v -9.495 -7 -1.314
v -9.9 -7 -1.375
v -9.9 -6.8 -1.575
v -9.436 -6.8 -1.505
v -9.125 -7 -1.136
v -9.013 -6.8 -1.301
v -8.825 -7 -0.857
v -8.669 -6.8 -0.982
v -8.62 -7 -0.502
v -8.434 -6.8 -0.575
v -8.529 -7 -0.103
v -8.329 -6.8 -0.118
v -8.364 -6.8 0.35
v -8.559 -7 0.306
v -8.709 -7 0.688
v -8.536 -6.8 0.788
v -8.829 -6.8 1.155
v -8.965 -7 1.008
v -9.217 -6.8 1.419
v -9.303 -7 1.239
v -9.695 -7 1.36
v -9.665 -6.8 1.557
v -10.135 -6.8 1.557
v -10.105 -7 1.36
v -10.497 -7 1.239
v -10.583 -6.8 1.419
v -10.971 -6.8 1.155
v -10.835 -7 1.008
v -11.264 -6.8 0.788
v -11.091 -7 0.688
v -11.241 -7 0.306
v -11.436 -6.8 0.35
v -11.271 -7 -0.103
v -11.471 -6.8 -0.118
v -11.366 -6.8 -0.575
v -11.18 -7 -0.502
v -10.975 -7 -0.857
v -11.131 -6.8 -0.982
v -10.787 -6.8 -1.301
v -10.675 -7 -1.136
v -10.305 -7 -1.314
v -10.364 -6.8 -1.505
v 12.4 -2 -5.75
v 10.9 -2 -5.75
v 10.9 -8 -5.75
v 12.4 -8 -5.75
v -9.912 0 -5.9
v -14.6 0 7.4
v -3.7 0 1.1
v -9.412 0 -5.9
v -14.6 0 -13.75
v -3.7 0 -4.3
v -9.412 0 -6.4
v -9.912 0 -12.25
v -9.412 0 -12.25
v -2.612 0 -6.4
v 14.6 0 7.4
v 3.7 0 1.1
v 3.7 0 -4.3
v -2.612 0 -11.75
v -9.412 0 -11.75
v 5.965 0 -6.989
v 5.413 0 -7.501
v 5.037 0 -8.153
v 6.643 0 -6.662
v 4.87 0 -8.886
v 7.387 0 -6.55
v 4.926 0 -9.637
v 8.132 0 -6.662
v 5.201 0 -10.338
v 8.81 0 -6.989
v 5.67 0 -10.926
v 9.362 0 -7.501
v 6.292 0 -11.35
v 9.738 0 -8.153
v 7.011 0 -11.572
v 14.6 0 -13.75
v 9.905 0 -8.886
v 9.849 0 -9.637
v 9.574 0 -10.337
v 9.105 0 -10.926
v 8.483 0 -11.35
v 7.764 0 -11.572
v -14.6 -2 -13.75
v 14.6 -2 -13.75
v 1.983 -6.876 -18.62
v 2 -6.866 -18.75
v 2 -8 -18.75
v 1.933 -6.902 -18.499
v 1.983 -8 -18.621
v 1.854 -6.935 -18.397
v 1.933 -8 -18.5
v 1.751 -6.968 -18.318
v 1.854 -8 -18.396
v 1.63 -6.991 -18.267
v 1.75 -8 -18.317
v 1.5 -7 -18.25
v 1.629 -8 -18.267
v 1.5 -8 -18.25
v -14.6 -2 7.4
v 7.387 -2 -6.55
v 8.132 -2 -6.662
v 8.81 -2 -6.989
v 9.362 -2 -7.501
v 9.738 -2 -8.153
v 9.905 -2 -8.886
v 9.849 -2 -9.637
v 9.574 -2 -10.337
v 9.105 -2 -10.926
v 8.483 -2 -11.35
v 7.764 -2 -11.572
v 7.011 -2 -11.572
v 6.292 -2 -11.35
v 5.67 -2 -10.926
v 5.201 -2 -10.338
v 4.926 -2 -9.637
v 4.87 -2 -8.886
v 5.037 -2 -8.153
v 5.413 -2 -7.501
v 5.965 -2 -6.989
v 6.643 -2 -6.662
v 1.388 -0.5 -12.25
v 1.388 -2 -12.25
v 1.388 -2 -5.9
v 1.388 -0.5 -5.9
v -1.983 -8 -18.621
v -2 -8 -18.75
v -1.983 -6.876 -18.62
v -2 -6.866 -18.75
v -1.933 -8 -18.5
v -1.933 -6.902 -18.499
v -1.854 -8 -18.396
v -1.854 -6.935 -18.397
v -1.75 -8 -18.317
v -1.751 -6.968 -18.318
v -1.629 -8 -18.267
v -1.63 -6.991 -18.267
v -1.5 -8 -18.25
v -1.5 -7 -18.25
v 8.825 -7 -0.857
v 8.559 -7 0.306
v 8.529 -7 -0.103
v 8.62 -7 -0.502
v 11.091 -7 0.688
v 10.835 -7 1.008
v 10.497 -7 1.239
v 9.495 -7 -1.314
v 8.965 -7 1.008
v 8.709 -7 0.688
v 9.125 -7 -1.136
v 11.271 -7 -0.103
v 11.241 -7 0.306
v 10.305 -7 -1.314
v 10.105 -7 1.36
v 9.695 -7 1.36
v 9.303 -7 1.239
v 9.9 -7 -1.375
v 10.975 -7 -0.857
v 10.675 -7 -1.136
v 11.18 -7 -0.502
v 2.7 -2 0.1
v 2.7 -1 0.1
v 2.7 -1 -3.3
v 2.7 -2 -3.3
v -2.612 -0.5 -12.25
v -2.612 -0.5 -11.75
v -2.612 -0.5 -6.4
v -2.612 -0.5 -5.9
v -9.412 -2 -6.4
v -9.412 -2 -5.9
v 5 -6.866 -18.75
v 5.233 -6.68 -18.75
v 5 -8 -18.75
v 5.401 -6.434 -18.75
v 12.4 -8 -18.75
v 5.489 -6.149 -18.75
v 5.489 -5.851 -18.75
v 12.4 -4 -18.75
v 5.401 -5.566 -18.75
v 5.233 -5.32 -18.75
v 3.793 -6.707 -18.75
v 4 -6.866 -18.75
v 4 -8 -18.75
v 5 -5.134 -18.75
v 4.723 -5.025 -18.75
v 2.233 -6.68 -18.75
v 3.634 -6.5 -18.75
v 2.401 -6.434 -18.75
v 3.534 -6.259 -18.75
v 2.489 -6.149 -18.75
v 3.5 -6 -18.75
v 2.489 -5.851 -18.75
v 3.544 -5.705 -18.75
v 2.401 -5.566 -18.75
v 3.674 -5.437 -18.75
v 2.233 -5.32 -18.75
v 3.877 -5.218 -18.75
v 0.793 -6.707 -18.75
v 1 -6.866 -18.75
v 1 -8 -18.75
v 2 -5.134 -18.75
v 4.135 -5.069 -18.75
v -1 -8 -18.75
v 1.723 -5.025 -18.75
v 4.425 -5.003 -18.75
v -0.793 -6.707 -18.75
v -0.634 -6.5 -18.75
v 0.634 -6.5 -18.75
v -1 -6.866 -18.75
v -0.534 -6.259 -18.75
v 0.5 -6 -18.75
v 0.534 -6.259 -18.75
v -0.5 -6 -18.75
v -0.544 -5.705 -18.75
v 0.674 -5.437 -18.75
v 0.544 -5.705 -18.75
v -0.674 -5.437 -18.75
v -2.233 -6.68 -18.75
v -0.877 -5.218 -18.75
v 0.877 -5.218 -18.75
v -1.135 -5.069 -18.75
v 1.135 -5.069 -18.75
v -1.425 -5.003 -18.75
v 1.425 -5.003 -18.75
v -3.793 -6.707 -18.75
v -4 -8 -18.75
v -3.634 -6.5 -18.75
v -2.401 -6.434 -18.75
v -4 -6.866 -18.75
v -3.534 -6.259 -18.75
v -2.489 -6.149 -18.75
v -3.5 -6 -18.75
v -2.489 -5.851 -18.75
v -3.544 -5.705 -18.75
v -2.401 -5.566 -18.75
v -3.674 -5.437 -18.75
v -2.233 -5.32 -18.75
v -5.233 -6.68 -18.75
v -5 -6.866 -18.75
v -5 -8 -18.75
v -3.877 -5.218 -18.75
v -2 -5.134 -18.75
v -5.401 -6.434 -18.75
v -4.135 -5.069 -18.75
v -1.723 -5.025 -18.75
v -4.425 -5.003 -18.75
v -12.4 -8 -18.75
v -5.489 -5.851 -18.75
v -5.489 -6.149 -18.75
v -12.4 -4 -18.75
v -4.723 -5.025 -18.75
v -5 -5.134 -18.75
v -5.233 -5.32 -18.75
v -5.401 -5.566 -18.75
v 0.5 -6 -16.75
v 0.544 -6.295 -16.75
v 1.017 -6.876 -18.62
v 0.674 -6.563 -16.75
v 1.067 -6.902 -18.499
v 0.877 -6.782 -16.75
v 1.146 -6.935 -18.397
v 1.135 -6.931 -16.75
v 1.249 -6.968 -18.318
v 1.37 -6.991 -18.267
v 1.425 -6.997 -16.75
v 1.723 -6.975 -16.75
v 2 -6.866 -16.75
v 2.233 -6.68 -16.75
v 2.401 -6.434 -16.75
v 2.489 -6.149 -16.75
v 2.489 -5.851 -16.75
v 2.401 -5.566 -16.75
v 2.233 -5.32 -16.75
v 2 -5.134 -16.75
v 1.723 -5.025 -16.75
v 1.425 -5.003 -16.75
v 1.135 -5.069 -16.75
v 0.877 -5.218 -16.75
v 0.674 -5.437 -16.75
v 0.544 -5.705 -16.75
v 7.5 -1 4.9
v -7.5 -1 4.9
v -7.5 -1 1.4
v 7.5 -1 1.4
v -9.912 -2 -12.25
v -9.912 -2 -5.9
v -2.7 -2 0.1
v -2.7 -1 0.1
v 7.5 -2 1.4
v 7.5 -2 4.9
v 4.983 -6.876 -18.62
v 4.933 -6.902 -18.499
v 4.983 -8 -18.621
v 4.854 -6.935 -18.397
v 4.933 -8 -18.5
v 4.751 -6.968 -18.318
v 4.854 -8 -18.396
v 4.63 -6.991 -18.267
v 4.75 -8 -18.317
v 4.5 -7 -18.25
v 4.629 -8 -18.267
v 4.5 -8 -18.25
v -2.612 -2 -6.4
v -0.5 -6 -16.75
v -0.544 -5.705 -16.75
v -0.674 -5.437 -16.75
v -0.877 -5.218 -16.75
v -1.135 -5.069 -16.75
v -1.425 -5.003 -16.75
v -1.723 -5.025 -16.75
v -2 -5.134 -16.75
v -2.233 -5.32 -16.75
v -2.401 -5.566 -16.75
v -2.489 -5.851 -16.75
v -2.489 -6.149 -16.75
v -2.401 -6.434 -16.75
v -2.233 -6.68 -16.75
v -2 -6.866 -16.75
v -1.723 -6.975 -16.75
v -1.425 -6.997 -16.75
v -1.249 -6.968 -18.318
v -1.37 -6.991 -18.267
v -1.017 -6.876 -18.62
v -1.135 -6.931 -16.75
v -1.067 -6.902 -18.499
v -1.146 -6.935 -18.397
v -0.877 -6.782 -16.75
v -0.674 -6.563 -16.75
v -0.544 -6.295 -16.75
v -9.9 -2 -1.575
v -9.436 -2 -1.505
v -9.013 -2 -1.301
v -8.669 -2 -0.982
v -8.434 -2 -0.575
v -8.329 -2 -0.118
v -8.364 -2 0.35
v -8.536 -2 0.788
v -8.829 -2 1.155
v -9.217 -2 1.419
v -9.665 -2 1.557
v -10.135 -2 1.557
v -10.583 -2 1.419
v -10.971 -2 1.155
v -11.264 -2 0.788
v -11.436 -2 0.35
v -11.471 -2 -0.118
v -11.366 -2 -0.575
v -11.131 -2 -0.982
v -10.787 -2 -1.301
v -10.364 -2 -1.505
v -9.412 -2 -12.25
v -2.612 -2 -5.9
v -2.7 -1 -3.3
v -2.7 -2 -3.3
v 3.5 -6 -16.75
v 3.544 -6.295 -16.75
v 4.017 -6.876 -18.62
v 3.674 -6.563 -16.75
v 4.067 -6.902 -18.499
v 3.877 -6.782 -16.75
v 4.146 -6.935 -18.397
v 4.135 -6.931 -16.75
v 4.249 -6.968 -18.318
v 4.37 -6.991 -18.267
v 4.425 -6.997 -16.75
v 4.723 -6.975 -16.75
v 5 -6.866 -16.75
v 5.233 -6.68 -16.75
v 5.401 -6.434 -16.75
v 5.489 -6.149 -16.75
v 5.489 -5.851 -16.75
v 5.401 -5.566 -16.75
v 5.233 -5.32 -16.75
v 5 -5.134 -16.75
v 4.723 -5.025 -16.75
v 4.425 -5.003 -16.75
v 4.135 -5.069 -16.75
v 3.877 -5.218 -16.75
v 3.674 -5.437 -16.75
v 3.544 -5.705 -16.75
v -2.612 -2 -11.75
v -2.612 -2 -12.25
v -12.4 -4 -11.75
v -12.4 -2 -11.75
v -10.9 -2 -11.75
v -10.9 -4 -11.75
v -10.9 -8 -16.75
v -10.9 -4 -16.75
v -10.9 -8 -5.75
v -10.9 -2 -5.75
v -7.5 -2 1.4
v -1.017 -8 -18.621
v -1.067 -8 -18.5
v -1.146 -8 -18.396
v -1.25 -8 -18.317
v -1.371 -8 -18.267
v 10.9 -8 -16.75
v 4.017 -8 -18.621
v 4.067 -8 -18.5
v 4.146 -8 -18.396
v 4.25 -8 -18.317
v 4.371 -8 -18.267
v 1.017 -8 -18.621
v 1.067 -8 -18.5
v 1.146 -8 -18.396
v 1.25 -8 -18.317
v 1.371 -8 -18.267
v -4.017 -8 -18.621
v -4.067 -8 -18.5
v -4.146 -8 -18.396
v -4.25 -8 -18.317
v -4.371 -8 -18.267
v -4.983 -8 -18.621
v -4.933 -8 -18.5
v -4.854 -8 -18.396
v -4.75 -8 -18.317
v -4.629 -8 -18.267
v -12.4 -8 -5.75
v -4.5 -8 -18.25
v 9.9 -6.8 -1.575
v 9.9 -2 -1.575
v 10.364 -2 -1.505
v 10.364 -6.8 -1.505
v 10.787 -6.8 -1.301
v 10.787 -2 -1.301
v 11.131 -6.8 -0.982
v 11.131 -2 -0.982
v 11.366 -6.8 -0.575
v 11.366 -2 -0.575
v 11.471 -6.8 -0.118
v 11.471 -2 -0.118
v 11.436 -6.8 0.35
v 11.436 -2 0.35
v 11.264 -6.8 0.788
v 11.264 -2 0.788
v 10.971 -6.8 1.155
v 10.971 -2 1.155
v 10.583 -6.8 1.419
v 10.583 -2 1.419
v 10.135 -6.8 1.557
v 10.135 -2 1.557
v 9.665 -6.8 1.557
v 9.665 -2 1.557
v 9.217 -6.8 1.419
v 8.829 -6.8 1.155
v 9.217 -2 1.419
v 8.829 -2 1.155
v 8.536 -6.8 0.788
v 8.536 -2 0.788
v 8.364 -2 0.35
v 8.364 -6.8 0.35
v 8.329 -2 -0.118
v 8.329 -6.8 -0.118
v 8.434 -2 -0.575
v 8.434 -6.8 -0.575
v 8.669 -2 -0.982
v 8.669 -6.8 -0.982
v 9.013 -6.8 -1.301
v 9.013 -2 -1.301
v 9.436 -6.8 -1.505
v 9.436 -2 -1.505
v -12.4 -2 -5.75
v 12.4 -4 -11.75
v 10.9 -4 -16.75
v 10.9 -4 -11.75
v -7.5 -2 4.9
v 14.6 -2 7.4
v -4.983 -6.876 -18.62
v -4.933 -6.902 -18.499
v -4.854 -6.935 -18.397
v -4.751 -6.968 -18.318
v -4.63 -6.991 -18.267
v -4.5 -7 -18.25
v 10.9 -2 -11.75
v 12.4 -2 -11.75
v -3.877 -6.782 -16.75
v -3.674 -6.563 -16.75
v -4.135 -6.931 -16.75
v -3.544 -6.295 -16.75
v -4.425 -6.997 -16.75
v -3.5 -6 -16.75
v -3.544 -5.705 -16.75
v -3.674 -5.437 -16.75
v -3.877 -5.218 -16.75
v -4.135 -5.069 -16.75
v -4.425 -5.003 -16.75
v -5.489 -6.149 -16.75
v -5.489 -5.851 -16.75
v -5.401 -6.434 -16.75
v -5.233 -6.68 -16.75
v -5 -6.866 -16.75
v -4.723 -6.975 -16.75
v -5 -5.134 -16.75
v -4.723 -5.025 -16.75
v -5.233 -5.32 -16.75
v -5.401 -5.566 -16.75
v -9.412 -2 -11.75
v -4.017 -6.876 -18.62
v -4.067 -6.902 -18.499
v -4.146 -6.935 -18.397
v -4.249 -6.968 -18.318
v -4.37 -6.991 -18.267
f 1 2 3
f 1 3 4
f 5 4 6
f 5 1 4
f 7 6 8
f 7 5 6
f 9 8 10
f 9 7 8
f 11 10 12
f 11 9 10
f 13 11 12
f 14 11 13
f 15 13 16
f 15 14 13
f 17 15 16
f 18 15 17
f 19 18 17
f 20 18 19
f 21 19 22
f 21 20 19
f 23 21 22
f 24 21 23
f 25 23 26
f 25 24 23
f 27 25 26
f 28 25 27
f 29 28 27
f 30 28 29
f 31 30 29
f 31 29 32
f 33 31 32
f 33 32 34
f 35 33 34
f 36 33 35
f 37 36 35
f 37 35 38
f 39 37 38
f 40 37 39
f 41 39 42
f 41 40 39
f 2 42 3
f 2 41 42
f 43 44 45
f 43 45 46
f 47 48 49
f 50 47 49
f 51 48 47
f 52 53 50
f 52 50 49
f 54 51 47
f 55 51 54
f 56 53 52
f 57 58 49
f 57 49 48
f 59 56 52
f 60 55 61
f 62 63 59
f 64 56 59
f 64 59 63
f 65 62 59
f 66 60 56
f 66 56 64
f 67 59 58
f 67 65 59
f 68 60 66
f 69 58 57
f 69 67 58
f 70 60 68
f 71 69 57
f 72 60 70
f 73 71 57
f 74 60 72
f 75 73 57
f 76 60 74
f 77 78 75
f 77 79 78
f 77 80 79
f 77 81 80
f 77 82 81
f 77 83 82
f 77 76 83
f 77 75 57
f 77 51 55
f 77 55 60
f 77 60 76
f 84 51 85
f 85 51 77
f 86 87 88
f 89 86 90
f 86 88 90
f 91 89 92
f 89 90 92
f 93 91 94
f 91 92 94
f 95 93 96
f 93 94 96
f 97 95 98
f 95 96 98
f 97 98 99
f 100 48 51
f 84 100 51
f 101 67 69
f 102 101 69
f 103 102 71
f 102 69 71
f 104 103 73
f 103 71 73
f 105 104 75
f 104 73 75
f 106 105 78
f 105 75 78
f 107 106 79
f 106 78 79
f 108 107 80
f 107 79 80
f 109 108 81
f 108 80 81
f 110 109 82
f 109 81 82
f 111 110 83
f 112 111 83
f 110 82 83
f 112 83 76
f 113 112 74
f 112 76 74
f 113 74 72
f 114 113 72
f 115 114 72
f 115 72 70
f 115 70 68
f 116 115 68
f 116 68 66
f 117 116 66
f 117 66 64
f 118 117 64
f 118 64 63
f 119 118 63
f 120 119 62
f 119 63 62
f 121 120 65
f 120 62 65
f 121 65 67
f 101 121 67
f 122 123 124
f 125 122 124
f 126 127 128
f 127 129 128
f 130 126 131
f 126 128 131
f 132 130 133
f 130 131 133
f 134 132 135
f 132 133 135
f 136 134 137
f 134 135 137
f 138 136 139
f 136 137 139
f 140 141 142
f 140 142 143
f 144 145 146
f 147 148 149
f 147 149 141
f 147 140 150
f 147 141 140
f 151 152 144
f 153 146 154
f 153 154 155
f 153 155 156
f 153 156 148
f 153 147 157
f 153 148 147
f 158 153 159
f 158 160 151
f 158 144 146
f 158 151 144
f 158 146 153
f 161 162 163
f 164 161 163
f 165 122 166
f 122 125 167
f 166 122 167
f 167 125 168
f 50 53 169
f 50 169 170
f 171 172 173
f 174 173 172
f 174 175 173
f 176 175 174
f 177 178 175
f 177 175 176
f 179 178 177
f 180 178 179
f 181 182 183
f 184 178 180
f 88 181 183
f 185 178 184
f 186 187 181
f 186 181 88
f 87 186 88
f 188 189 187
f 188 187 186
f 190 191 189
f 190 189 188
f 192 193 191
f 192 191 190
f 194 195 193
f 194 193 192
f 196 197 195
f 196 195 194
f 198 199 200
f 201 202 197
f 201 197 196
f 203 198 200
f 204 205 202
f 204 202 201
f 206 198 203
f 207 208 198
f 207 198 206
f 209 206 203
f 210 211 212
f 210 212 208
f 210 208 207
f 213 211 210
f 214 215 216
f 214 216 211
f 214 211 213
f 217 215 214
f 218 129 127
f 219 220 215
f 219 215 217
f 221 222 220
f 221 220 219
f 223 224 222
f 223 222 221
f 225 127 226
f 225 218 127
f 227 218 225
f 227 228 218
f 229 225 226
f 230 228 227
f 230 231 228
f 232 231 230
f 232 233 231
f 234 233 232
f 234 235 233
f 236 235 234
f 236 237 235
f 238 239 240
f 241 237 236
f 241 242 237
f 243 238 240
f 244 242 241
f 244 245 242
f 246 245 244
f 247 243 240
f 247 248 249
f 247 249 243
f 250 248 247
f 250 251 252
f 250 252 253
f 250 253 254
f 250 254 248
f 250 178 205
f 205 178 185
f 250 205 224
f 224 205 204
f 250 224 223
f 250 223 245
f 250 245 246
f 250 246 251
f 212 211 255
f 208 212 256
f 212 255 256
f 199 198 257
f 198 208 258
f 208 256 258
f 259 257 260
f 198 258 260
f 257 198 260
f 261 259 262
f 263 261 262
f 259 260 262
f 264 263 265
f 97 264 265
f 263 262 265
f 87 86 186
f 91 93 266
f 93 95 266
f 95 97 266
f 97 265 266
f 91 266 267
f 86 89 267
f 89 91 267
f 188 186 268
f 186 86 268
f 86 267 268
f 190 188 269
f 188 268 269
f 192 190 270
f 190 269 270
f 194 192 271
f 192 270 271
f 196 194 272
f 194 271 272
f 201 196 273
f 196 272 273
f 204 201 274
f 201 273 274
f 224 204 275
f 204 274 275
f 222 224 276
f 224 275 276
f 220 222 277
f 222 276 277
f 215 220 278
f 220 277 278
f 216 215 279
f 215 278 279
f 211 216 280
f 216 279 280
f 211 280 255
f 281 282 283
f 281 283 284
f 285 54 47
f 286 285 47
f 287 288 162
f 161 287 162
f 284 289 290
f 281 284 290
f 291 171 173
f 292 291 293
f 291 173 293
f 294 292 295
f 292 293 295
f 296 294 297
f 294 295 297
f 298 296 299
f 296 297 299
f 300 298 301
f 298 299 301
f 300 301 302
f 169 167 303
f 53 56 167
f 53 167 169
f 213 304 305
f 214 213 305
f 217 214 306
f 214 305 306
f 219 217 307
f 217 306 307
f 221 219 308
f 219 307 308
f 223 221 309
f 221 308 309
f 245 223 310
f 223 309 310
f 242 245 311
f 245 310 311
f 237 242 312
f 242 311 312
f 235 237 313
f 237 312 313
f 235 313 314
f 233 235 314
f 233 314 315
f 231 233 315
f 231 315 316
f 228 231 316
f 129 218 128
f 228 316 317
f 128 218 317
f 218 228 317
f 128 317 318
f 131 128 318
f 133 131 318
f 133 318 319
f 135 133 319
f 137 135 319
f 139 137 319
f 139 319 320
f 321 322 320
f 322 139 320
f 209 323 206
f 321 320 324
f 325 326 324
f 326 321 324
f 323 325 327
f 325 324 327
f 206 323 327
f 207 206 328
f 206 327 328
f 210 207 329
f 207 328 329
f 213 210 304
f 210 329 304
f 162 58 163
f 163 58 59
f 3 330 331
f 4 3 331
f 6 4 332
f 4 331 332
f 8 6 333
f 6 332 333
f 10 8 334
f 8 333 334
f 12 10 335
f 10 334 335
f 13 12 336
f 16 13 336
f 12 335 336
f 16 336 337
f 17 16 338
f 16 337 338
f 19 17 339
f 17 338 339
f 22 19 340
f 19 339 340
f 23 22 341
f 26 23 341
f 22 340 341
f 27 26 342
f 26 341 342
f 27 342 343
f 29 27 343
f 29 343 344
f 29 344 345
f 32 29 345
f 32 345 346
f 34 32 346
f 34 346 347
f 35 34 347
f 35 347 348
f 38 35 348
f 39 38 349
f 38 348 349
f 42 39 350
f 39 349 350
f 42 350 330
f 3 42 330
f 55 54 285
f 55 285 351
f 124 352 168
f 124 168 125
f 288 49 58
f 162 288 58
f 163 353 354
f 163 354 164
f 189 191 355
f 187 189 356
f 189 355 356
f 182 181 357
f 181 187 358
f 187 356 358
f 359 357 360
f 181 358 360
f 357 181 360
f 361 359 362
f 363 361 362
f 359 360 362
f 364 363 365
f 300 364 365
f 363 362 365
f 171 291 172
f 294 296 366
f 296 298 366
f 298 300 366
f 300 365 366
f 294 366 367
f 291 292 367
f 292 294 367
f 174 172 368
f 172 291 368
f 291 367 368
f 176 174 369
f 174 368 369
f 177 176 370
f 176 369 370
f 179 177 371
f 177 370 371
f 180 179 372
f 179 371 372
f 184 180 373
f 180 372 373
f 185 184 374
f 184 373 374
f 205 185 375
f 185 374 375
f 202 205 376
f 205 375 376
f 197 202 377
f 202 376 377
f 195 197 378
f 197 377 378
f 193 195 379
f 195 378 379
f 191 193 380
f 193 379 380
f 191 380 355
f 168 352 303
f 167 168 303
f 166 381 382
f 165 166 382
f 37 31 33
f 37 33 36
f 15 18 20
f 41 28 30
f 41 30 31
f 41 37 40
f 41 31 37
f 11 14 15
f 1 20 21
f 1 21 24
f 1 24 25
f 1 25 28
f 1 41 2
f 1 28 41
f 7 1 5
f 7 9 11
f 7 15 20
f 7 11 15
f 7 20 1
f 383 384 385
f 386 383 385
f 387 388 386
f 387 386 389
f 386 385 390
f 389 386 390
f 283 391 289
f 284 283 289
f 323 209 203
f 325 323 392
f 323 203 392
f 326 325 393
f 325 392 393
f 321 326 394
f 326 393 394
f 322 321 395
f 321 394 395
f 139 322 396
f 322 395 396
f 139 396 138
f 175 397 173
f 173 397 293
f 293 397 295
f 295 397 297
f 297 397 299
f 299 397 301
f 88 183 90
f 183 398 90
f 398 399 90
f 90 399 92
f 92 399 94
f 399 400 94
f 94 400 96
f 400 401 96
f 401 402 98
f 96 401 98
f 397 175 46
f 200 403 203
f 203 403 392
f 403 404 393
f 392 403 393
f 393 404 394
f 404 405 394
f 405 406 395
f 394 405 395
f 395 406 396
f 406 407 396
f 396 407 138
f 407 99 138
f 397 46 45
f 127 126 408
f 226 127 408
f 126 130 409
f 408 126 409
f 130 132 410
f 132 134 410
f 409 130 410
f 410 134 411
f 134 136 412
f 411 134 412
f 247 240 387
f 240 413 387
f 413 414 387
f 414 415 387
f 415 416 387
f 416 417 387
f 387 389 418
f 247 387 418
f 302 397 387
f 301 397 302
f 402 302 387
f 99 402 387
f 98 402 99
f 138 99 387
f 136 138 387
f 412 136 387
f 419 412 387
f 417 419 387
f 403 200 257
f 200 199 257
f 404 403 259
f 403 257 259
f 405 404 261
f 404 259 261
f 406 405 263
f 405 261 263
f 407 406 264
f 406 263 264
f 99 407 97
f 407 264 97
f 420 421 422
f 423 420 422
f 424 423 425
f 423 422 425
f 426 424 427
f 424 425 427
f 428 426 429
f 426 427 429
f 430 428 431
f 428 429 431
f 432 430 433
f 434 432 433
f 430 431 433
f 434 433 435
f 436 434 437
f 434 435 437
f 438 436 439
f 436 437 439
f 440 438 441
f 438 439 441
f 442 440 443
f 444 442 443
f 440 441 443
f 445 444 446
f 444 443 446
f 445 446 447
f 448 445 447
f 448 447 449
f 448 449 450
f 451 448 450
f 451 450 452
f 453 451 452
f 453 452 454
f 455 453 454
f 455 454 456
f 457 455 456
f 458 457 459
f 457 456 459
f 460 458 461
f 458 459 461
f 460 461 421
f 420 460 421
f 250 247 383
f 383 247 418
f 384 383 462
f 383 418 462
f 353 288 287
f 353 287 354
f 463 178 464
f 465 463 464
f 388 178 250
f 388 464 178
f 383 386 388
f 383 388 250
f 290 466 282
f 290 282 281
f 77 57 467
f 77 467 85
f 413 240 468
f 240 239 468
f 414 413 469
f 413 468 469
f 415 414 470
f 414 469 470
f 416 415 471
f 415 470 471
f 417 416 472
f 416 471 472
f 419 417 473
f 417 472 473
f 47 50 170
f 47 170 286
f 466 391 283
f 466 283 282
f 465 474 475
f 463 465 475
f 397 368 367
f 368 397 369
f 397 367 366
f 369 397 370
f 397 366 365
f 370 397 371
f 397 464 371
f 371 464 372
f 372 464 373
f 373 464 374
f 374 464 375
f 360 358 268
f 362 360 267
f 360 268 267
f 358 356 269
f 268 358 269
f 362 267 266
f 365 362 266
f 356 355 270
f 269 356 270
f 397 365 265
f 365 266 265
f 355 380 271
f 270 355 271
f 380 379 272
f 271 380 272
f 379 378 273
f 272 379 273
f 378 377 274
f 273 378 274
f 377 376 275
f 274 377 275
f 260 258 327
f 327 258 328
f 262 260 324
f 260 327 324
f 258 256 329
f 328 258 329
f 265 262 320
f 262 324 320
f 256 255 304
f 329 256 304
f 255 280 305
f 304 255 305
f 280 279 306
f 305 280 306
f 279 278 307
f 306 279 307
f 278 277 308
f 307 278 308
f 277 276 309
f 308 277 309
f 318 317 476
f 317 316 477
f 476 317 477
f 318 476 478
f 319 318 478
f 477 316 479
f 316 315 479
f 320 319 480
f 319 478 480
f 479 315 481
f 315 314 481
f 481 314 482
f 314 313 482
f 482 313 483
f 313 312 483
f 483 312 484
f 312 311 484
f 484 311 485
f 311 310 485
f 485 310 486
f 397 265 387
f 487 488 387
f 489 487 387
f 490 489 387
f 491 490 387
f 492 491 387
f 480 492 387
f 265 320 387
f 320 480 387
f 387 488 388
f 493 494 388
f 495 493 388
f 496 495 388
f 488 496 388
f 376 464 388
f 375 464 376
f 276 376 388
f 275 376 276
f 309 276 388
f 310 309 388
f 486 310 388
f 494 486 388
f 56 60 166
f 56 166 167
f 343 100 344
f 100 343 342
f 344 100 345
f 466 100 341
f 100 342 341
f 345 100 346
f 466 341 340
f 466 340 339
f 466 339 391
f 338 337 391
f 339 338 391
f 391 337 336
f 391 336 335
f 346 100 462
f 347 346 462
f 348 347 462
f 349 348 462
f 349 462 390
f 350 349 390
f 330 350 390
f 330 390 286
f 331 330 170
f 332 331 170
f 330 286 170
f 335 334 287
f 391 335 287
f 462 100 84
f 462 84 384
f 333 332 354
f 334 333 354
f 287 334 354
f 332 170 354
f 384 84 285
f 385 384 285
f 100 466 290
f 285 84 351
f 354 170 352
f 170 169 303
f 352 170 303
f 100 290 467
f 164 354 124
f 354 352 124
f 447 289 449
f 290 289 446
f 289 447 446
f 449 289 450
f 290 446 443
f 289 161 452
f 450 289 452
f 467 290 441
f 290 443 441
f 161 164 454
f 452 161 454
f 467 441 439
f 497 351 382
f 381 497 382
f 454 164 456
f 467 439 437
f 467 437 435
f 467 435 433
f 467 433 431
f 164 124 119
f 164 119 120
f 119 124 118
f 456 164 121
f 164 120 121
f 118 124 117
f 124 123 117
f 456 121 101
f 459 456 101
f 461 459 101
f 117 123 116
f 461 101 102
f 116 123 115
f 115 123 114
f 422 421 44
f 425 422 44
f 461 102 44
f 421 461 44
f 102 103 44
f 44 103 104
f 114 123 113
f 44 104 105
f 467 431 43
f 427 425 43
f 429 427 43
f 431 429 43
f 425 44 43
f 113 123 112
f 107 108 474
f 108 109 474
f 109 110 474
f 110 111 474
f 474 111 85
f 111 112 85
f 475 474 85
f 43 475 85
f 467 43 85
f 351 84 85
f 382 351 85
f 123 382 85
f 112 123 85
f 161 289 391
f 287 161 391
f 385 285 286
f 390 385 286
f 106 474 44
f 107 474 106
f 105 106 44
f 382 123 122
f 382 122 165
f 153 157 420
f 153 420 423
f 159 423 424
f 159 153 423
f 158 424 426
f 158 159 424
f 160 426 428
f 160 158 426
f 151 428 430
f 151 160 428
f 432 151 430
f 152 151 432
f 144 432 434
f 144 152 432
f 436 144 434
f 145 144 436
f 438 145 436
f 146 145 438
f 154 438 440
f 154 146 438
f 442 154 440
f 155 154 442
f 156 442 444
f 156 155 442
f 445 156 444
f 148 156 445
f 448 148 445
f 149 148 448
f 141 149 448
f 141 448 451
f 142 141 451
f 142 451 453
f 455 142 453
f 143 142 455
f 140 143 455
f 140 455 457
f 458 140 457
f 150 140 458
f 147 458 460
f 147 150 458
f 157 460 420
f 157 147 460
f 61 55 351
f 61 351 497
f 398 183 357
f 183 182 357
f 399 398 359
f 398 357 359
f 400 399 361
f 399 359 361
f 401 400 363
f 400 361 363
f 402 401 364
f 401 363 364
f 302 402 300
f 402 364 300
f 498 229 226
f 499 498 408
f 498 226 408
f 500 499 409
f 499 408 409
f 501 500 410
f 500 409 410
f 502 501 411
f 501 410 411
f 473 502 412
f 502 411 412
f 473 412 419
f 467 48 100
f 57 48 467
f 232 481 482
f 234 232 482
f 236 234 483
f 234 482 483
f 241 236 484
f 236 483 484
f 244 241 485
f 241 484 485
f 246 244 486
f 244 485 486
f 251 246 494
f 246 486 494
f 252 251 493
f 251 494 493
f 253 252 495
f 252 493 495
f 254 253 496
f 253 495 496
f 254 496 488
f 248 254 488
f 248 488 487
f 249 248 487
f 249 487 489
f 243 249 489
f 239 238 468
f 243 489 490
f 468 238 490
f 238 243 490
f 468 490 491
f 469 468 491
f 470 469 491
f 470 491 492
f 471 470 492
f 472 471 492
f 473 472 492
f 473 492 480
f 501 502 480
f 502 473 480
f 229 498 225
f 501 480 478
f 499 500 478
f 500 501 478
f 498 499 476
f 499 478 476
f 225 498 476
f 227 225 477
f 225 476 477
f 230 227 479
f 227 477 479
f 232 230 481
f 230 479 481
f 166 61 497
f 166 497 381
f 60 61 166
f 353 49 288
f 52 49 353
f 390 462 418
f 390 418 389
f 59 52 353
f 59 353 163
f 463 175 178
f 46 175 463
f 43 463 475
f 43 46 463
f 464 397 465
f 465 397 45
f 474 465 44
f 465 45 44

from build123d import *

# Parameters (mm, degrees)
PARTS_W             = 29.2
PARTS_H             = 21.15
MAIN_FACE_DEPTH     = 2
SKETCH3_R           = 2.525
IR_CUT_DEPTH        = 2
TSOP_GROOVE_DEPTH   = 1.5
SKETCH4_W           = 5.4
SKETCH4_H           = 3.4
TOF_CUT_DEPTH       = 2
SKETCH6_R           = 1.575
SHAFTS_DEPTH        = 5
CHAMFER1_SIZE       = 0.2
SKETCH7_W           = 15
SKETCH7_H           = 3.5
PINSLOTS_DEPTH      = 1
TOFWINDOW_SIZE      = 1
SKETCH8_W           = 1.5
SKETCH8_H           = 6
BOSS_EXTRUDE1_DEPTH = 6
SKETCH14_W          = 1.5
SKETCH14_H          = 4
BOSS_EXTRUDE4_DEPTH = 5
SKETCH15_W          = 24.8
SKETCH15_H          = 4
BOSS_EXTRUDE5_DEPTH = 2
CUT_EXTRUDE4_REACH  = 31.332
SKETCH16_R          = 1
CUT_EXTRUDE5_START  = -0.5
CUT_EXTRUDE5_DEPTH  = 0.5
FILLET1_R           = 0.5


with BuildPart() as part:
    # Parts → Main Face (new body)
    with BuildSketch(Plane(origin=(0, 0, 0), x_dir=(1, 0, 0), z_dir=(0, 1, 0))):
        with Locations((0, 3.175)):
            Rectangle(PARTS_W, PARTS_H)
    extrude(amount=-MAIN_FACE_DEPTH)

    # Sketch3 → IR Cut (cut)
    with BuildSketch(Plane(origin=(0, 0, 0), x_dir=(1, 0, 0), z_dir=(0, 1, 0))):
        with Locations(Location((7.3875, 9.075, 0), (0, 0, 270))):
            Circle(SKETCH3_R)
        Polygon((-2.6125, 11.75), (-2.6125, 6.4), (-9.4125, 6.4), (-9.4125, 5.9), (-9.9125, 5.9), (-9.9125, 6.4), (-9.9125, 11.75), (-9.9125, 12.25), (-9.4125, 12.25), (-9.4125, 11.75), align=None)
    extrude(amount=-IR_CUT_DEPTH, mode=Mode.SUBTRACT)

    # Sketch5 → TSOP Groove (cut)
    with BuildSketch(Plane.XZ.offset(2)):
        Polygon((-2.6125, -11.75), (-2.6125, -6.4), (-2.6125, -5.9), (1.3875, -5.9), (1.3875, -6.4), (1.3875, -11.75), (1.3875, -12.25), (-2.6125, -12.25), align=None)
    extrude(amount=-TSOP_GROOVE_DEPTH, mode=Mode.SUBTRACT)

    # Sketch4 → TOF Cut (cut)
    with BuildSketch(Plane(origin=(0, 0, 0), x_dir=(1, 0, 0), z_dir=(0, 1, 0))):
        with Locations((0, 1.6)):
            Rectangle(SKETCH4_W, SKETCH4_H)
    extrude(amount=-TOF_CUT_DEPTH, mode=Mode.SUBTRACT)

    # Sketch6 → Shafts (add)
    with BuildSketch(Plane.XZ.offset(2)):
        with Locations(Location((-9.9, 0, 0), (0, 0, 270))):
            Circle(SKETCH6_R)
        with Locations(Location((9.9, 0, 0), (0, 0, 270))):
            Circle(SKETCH6_R)
    extrude(amount=SHAFTS_DEPTH)

    # Chamfer1
    chamfer1_edges = [part.edges().sort_by_distance(p)[0] for p in [
        (9.9, -7, 1.575),
        (-9.9, -7, 1.575),
    ]]
    chamfer(chamfer1_edges, length=CHAMFER1_SIZE)

    # Sketch7 → PinSlots (cut)
    with BuildSketch(Plane.XZ.offset(2)):
        with Locations((0, 3.15)):
            Rectangle(SKETCH7_W, SKETCH7_H)
    extrude(amount=-PINSLOTS_DEPTH, mode=Mode.SUBTRACT)

    # ToFWindow
    tofwindow_edges = [part.edges().sort_by_distance(p)[0] for p in [
        (-2.7, 0, -1.6),
        (0, 0, 0.1),
        (2.7, 0, -1.6),
        (0, 0, -3.3),
    ]]
    chamfer(tofwindow_edges, length=TOFWINDOW_SIZE)

    # Sketch8 → Boss-Extrude1 (add)
    with BuildSketch(Plane.XZ.offset(2)):
        with Locations((-11.65, -8.75)):
            Rectangle(SKETCH8_W, SKETCH8_H)
        with Locations((11.65, -8.75)):
            Rectangle(SKETCH8_W, SKETCH8_H)
    extrude(amount=BOSS_EXTRUDE1_DEPTH)

    # Sketch14 → Boss-Extrude4 (add)
    with BuildSketch(Plane(origin=(0, 0, -11.75), x_dir=(-1, 0, 0), z_dir=(0, 0, -1))):
        with Locations((-11.65, -6)):
            Rectangle(SKETCH14_W, SKETCH14_H)
        with Locations((11.65, -6)):
            Rectangle(SKETCH14_W, SKETCH14_H)
    extrude(amount=BOSS_EXTRUDE4_DEPTH)

    # Sketch15 → Boss-Extrude5 (add)
    with BuildSketch(Plane(origin=(0, 0, -16.75), x_dir=(-1, 0, 0), z_dir=(0, 0, -1))):
        with Locations((0, -6)):
            Rectangle(SKETCH15_W, SKETCH15_H)
    extrude(amount=BOSS_EXTRUDE5_DEPTH)

    # Sketch16 → Cut-Extrude4 (cut, up to next)
    with BuildSketch(Plane.XY.offset(-16.75), mode=Mode.PRIVATE) as cut_extrude4_sk1:
        with Locations((-4.5, -6)):
            Circle(SKETCH16_R)
    cut_extrude4_tool1 = extrude(cut_extrude4_sk1.sketch, amount=-CUT_EXTRUDE4_REACH, mode=Mode.PRIVATE) & part.part
    # Sketch16 → Cut-Extrude4 (cut, up to next)
    with BuildSketch(Plane.XY.offset(-16.75), mode=Mode.PRIVATE) as cut_extrude4_sk2:
        with Locations((-1.5, -6)):
            Circle(SKETCH16_R)
    cut_extrude4_tool2 = extrude(cut_extrude4_sk2.sketch, amount=-CUT_EXTRUDE4_REACH, mode=Mode.PRIVATE) & part.part
    # Sketch16 → Cut-Extrude4 (cut, up to next)
    with BuildSketch(Plane.XY.offset(-16.75), mode=Mode.PRIVATE) as cut_extrude4_sk3:
        with Locations(Location((1.5, -6, 0), (0, 0, 180))):
            Circle(SKETCH16_R)
    cut_extrude4_tool3 = extrude(cut_extrude4_sk3.sketch, amount=-CUT_EXTRUDE4_REACH, mode=Mode.PRIVATE) & part.part
    # Sketch16 → Cut-Extrude4 (cut, up to next)
    with BuildSketch(Plane.XY.offset(-16.75), mode=Mode.PRIVATE) as cut_extrude4_sk4:
        with Locations(Location((4.5, -6, 0), (0, 0, 180))):
            Circle(SKETCH16_R)
    cut_extrude4_tool4 = extrude(cut_extrude4_sk4.sketch, amount=-CUT_EXTRUDE4_REACH, mode=Mode.PRIVATE) & part.part
    add(cut_extrude4_tool1.solids().sort_by_distance((-4.5, -6, -16.75))[0], mode=Mode.SUBTRACT)
    add(cut_extrude4_tool2.solids().sort_by_distance((-1.5, -6, -16.75))[0], mode=Mode.SUBTRACT)
    add(cut_extrude4_tool3.solids().sort_by_distance((1.5, -6, -16.75))[0], mode=Mode.SUBTRACT)
    add(cut_extrude4_tool4.solids().sort_by_distance((4.5, -6, -16.75))[0], mode=Mode.SUBTRACT)

    # Sketch17 → Cut-Extrude5 (cut)
    with BuildSketch(Plane(origin=(0, 0, -18.75), x_dir=(-1, 0, 0), z_dir=(0, 0, -1)).offset(CUT_EXTRUDE5_START)):
        with BuildLine():
            Line((-5, -6.866025404), (-5, -8))
            Line((-5, -8), (-4, -8))
            Line((-4, -8), (-4, -6.866025404))
            ThreePointArc((-4, -6.866025404), (-4.5, -7), (-5, -6.866025404))
        make_face()
        with BuildLine():
            Line((-1, -8), (-1, -6.866025404))
            ThreePointArc((-1, -6.866025404), (-1.5, -7), (-2, -6.866025404))
            Line((-2, -6.866025404), (-2, -8))
            Line((-2, -8), (-1, -8))
        make_face()
        with BuildLine():
            Line((2, -8), (2, -6.866025404))
            ThreePointArc((2, -6.866025404), (1.5, -7), (1, -6.866025404))
            Line((1, -6.866025404), (1, -8))
            Line((1, -8), (2, -8))
        make_face()
        with BuildLine():
            Line((5, -8), (5, -6.866025404))
            ThreePointArc((5, -6.866025404), (4.5, -7), (4, -6.866025404))
            Line((4, -6.866025404), (4, -8))
            Line((4, -8), (5, -8))
        make_face()
    extrude(amount=CUT_EXTRUDE5_DEPTH, mode=Mode.SUBTRACT)

    # Fillet1
    fillet1_edges = [part.edges().sort_by_distance(p)[0] for p in [
        (-5, -7.433012702, -18.25),
        (-4, -7.433012702, -18.25),
        (-2, -7.433012702, -18.25),
        (-1, -7.433012702, -18.25),
        (1, -7.433012702, -18.25),
        (2, -7.433012702, -18.25),
        (4, -7.433012702, -18.25),
        (5, -7.433012702, -18.25),
    ]]
    fillet(fillet1_edges, radius=FILLET1_R - 0.0001)  # a hair under: the kernel refuses the full size


solid = part.part
